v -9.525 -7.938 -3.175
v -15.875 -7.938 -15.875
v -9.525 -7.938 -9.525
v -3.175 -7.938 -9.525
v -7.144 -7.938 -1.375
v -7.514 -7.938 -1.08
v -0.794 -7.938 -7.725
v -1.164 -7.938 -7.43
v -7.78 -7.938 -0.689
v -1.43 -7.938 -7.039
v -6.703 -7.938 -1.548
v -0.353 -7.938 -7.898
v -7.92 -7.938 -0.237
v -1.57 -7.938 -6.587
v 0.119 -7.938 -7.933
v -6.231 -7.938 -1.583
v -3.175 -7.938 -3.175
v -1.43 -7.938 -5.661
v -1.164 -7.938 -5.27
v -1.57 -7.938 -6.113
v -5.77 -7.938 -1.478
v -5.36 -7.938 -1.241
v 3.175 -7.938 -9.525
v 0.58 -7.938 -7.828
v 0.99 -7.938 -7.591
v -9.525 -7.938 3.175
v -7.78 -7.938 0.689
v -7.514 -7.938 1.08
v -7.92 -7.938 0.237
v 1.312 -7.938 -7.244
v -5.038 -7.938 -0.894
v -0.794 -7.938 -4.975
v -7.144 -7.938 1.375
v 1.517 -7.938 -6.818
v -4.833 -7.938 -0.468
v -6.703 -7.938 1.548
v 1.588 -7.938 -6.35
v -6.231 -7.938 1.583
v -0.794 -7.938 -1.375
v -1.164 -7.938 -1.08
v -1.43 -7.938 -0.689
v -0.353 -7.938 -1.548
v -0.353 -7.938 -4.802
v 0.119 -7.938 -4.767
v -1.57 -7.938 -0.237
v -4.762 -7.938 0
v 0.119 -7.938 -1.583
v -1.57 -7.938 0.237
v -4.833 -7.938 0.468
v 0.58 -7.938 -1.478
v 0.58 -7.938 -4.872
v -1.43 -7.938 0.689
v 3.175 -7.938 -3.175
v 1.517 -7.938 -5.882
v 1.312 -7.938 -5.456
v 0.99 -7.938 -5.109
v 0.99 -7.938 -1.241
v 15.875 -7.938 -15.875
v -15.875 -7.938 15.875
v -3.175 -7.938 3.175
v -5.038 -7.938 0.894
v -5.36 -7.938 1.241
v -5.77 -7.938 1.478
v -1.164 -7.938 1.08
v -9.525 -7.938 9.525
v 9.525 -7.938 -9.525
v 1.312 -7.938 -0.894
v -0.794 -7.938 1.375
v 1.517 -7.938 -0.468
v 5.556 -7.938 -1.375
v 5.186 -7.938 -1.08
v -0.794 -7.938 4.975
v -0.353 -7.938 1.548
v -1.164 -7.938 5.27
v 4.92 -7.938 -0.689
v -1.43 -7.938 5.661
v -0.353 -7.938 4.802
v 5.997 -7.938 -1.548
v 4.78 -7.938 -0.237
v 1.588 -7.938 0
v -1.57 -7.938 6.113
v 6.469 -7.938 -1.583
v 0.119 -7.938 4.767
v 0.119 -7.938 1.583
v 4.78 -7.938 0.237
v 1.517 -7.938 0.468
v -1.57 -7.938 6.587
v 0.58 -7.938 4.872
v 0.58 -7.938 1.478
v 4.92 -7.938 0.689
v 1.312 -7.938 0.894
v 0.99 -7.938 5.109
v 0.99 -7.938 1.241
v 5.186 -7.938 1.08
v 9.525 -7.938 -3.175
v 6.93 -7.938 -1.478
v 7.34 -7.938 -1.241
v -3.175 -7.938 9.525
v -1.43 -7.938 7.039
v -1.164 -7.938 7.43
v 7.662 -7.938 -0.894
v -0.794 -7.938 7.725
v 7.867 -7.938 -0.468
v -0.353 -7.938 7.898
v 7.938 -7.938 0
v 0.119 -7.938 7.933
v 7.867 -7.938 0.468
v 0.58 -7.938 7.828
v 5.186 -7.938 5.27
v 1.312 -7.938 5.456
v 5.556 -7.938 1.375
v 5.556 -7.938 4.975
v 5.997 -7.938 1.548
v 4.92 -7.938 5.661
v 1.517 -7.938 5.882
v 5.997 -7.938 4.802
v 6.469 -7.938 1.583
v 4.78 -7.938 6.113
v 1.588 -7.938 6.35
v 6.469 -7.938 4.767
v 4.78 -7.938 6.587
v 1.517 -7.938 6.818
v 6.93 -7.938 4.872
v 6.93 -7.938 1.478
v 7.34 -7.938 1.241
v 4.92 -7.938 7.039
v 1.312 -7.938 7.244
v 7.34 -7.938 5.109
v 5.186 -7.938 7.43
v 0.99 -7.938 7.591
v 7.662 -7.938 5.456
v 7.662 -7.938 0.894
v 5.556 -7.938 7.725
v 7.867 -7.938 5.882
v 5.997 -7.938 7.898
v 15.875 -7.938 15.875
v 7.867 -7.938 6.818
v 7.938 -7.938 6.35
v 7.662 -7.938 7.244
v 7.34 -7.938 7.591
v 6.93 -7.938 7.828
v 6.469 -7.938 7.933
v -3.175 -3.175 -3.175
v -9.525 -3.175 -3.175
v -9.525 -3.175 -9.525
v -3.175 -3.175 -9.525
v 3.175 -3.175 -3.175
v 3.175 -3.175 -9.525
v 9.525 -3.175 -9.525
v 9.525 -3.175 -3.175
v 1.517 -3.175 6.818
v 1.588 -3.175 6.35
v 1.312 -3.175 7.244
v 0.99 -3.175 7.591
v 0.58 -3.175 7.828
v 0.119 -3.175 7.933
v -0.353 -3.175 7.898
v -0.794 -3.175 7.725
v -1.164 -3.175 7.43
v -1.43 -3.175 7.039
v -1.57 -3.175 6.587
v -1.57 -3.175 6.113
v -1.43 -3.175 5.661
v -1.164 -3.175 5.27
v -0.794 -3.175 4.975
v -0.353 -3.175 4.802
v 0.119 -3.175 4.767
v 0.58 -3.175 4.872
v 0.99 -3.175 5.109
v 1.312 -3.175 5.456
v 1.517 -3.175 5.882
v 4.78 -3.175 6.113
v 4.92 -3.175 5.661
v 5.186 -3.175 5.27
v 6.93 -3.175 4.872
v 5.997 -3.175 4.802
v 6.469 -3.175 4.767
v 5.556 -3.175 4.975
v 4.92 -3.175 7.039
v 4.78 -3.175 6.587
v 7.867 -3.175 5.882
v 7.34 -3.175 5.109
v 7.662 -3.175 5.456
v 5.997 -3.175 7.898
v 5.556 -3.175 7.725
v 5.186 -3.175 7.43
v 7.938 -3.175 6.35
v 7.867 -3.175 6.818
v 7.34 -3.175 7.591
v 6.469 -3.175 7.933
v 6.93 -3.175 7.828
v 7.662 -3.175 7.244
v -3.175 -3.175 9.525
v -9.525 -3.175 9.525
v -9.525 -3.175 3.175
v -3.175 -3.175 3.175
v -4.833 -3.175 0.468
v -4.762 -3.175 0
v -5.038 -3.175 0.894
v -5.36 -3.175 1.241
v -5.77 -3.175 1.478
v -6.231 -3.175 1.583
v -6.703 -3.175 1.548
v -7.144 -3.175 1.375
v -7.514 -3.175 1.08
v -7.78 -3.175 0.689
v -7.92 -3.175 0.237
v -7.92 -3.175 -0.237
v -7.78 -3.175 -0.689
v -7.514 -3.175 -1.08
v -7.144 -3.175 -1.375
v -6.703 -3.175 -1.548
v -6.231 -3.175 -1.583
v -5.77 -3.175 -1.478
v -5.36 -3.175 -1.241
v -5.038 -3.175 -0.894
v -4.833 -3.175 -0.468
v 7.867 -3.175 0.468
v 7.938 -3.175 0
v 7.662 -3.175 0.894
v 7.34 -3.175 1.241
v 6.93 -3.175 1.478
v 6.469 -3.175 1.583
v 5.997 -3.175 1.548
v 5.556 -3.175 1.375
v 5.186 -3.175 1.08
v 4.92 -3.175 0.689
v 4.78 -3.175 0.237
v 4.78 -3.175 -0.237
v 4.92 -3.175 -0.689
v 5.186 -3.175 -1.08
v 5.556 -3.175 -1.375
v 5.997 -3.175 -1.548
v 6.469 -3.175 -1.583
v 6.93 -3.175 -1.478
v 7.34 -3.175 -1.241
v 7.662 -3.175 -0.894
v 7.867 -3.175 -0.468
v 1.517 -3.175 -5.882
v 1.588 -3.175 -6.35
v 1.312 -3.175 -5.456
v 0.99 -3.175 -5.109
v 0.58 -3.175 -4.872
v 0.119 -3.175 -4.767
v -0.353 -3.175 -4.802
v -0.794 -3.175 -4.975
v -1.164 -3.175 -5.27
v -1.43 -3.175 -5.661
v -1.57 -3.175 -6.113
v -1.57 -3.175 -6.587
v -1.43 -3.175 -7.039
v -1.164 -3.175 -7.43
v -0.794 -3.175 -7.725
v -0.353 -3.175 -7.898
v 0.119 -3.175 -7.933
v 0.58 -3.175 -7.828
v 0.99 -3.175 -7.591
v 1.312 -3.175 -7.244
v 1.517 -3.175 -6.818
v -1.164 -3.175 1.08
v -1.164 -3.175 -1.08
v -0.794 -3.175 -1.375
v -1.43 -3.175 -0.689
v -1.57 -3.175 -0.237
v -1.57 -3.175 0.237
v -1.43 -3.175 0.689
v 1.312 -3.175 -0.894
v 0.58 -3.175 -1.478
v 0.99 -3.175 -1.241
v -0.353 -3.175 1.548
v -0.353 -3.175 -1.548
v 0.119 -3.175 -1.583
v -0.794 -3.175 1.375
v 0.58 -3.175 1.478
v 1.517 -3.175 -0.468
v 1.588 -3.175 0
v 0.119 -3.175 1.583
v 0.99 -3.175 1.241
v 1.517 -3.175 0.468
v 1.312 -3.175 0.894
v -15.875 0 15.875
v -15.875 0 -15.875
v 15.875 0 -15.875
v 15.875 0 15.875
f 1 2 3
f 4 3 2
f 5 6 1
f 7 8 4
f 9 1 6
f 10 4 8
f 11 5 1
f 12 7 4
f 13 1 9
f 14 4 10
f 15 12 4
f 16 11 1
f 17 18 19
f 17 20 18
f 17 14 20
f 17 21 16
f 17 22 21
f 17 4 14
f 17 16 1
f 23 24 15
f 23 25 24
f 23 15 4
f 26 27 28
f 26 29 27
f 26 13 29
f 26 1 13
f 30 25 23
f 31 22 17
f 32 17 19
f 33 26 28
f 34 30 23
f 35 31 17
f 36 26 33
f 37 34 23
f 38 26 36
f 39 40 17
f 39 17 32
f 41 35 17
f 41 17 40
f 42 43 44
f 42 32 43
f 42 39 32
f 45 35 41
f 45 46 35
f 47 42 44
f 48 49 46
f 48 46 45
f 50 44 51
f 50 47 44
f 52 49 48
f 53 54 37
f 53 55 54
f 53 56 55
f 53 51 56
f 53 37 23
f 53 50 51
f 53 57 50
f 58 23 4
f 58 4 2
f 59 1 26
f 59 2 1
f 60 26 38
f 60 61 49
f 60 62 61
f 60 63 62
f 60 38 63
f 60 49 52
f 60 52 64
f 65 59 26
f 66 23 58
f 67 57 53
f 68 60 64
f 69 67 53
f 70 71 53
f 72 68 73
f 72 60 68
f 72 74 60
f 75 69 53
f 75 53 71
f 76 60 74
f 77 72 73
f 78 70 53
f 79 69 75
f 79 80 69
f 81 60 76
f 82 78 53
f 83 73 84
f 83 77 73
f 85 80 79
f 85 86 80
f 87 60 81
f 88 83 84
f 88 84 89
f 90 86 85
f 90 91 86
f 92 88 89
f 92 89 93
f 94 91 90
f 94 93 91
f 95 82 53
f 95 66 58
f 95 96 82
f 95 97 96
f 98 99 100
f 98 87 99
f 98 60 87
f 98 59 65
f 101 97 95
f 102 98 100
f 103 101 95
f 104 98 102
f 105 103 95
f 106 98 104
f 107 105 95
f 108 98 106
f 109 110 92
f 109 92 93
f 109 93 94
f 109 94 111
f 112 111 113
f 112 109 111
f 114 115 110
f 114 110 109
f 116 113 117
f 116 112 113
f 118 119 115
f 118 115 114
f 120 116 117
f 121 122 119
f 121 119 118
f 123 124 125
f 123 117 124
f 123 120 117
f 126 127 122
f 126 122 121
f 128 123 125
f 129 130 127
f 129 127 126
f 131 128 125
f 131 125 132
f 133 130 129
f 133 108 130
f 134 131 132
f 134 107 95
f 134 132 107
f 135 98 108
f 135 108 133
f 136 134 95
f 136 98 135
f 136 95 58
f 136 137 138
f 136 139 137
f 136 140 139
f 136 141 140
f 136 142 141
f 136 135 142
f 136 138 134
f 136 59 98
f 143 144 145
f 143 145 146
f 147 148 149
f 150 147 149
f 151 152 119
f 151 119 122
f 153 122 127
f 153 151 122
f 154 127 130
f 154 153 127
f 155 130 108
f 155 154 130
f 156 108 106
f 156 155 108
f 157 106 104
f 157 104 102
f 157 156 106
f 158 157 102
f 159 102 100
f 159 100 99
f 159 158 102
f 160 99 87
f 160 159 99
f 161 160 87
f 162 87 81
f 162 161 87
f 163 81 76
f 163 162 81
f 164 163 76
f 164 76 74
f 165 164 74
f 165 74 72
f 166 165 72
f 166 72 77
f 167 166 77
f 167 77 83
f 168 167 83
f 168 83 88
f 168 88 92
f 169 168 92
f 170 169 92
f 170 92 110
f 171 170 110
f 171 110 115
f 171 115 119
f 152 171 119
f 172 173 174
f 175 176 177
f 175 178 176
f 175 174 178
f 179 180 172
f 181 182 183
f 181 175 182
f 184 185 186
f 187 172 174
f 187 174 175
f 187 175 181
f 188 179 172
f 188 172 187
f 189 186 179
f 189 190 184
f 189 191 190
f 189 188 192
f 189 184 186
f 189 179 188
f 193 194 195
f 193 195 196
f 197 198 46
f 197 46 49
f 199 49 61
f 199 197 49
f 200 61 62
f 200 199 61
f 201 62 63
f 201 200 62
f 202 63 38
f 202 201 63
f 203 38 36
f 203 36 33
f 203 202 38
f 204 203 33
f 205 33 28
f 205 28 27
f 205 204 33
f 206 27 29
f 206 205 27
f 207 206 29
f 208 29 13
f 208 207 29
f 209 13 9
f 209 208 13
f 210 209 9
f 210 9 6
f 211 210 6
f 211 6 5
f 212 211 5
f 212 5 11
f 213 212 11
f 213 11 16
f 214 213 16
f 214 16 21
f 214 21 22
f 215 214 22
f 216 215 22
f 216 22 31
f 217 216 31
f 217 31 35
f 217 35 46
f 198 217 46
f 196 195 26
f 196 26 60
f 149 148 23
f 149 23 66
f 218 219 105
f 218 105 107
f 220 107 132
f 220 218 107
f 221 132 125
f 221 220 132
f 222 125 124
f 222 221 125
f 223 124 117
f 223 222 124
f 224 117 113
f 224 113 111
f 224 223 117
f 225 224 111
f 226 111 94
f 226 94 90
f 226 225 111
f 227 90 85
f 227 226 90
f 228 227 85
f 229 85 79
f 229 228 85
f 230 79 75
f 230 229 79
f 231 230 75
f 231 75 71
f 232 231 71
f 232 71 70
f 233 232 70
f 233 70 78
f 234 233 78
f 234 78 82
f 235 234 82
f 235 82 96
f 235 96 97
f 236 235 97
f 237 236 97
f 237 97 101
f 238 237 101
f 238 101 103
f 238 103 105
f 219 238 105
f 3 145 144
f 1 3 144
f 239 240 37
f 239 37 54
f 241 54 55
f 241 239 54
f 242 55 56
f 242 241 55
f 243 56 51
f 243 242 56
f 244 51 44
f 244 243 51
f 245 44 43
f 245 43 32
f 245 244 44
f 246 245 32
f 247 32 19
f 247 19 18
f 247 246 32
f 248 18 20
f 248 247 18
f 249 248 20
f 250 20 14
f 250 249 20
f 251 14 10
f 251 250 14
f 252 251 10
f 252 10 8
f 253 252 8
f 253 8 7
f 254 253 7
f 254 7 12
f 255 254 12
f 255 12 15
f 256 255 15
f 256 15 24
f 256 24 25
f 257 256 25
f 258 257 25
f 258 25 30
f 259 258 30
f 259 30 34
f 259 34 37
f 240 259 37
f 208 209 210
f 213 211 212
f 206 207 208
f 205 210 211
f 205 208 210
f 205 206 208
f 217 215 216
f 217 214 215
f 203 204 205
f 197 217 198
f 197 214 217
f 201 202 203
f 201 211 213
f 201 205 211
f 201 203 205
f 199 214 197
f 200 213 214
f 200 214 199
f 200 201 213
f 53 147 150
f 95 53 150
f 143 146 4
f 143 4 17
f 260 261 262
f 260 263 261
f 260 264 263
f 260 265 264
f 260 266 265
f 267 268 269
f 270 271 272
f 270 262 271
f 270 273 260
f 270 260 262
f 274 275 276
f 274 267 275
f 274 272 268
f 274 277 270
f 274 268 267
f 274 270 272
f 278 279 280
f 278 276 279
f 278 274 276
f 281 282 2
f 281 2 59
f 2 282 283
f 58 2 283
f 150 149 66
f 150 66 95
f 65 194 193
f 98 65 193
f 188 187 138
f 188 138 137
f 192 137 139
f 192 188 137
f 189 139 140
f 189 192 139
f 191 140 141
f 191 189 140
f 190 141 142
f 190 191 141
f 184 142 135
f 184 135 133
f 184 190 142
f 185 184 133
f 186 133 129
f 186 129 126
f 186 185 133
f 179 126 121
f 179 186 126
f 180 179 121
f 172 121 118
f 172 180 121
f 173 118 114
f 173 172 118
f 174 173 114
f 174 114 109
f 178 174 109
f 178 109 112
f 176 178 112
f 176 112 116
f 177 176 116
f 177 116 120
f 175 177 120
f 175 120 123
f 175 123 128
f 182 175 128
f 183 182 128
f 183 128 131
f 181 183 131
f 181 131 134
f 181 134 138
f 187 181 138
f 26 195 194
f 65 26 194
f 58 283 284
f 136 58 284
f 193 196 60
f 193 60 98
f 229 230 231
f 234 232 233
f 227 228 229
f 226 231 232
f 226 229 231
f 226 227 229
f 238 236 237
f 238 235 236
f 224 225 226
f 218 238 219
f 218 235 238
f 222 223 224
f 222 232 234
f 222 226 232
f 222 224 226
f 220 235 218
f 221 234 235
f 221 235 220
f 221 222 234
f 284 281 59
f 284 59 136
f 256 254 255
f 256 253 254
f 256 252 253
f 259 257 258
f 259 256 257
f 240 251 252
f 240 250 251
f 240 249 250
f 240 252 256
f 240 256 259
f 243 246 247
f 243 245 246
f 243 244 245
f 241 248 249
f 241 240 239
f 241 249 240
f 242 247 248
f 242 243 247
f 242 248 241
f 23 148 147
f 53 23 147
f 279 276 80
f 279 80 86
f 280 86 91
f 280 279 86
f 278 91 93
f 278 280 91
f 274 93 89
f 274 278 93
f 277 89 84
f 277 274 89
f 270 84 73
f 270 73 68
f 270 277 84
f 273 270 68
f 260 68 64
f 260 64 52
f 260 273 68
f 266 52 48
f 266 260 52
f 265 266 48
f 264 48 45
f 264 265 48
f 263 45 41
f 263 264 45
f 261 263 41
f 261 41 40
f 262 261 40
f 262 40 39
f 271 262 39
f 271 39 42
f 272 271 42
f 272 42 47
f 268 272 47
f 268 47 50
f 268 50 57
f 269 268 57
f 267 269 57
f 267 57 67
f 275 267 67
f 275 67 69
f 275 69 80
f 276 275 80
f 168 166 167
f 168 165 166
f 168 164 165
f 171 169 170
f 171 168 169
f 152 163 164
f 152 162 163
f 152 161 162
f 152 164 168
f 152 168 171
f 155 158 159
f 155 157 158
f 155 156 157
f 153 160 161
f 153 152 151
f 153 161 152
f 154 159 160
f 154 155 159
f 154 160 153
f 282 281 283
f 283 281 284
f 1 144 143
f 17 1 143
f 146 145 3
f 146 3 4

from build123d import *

# Parameters (mm, degrees)
F0_W     = 31.75
F0_H     = 31.75
F0_W_2   = 6.35
F0_H_2   = 6.35
F0_R     = 1.5875
F1_DEPTH = 7.9375
F2_DEPTH = 3.175


# Not quite as in the source:
# - a length typed as a fraction of an inch, garbled in the dataset ("3 / 203.2 mm" for 3/8 in), is restored


with BuildPart() as f1:
    # F0 (on Front) → F1 (new body)
    with BuildSketch(Plane.XZ):
        Rectangle(F0_W, F0_H)
        with Locations((-6.35, -6.35)):
            Rectangle(F0_W_2, F0_H_2, mode=Mode.SUBTRACT)
        with Locations((0, -6.35)):
            Circle(F0_R, mode=Mode.SUBTRACT)
        with Locations((6.35, -6.35)):
            Rectangle(F0_W_2, F0_H_2, mode=Mode.SUBTRACT)
        with Locations((-6.35, 0)):
            Circle(F0_R, mode=Mode.SUBTRACT)
        with Locations((-6.35, 6.35)):
            Rectangle(F0_W_2, F0_H_2, mode=Mode.SUBTRACT)
        Circle(F0_R, mode=Mode.SUBTRACT)
        with Locations((6.35, 0)):
            Circle(F0_R, mode=Mode.SUBTRACT)
        with Locations((0, 6.35)):
            Circle(F0_R, mode=Mode.SUBTRACT)
        with Locations((6.35, 6.35)):
            Circle(F0_R, mode=Mode.SUBTRACT)
    extrude(amount=F1_DEPTH)

    # F0 (on Front) → F2 (join)
    with BuildSketch(Plane.XZ):
        Rectangle(F0_W, F0_H)
        with Locations((-6.35, -6.35)):
            Rectangle(F0_W_2, F0_H_2, mode=Mode.SUBTRACT)
        with Locations((0, -6.35)):
            Circle(F0_R, mode=Mode.SUBTRACT)
        with Locations((6.35, -6.35)):
            Rectangle(F0_W_2, F0_H_2, mode=Mode.SUBTRACT)
        with Locations((-6.35, 0)):
            Circle(F0_R, mode=Mode.SUBTRACT)
        with Locations((-6.35, 6.35)):
            Rectangle(F0_W_2, F0_H_2, mode=Mode.SUBTRACT)
        Circle(F0_R, mode=Mode.SUBTRACT)
        with Locations((6.35, 0)):
            Circle(F0_R, mode=Mode.SUBTRACT)
        with Locations((0, 6.35)):
            Circle(F0_R, mode=Mode.SUBTRACT)
        with Locations((6.35, 6.35)):
            Circle(F0_R, mode=Mode.SUBTRACT)
        with Locations((6.35, -6.35)):
            Rectangle(F0_W_2, F0_H_2)
        with Locations((-6.35, -6.35)):
            Rectangle(F0_W_2, F0_H_2)
        with Locations((-6.35, 6.35)):
            Rectangle(F0_W_2, F0_H_2)
        with Locations((-6.35, 0)):
            Circle(F0_R)
        Circle(F0_R)
        with Locations((0, -6.35)):
            Circle(F0_R)
        with Locations((6.35, 0)):
            Circle(F0_R)
        with Locations((6.35, 6.35)):
            Circle(F0_R)
        with Locations((0, 6.35)):
            Circle(F0_R)
    extrude(amount=F2_DEPTH)


solid = f1.part
